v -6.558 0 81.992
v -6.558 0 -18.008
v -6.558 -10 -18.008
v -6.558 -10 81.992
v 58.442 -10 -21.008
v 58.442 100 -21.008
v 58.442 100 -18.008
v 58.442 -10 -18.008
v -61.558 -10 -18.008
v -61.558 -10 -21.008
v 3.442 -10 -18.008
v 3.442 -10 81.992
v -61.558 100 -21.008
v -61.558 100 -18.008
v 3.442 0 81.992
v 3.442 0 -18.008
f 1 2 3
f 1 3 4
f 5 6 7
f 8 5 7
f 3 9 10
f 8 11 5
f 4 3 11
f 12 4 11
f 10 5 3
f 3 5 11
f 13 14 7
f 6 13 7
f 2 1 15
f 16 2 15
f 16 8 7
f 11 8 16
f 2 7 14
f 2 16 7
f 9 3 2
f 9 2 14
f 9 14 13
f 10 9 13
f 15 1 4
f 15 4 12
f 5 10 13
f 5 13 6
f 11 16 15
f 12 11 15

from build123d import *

# Parameters (mm, degrees)
F0_W     = 10
F0_H     = 100
F1_DEPTH = 10
F3_DEPTH = 110


with BuildPart() as f1:
    # F0 (on Front) → F1 (new body)
    with BuildSketch(Plane.XZ):
        with Locations((-1.558005, 31.992308)):
            Rectangle(F0_W, F0_H)
    extrude(amount=F1_DEPTH)

    # F2 (on face) → F3 (join)
    with BuildSketch(Plane.XZ.offset(10)):
        Polygon((3.441995, -18.007692), (-6.558005, -18.007692), (-61.558005, -18.007692), (-61.558005, -21.007692), (58.441995, -21.007692), (58.441995, -18.007692), align=None)
    extrude(amount=-F3_DEPTH)


solid = f1.part
